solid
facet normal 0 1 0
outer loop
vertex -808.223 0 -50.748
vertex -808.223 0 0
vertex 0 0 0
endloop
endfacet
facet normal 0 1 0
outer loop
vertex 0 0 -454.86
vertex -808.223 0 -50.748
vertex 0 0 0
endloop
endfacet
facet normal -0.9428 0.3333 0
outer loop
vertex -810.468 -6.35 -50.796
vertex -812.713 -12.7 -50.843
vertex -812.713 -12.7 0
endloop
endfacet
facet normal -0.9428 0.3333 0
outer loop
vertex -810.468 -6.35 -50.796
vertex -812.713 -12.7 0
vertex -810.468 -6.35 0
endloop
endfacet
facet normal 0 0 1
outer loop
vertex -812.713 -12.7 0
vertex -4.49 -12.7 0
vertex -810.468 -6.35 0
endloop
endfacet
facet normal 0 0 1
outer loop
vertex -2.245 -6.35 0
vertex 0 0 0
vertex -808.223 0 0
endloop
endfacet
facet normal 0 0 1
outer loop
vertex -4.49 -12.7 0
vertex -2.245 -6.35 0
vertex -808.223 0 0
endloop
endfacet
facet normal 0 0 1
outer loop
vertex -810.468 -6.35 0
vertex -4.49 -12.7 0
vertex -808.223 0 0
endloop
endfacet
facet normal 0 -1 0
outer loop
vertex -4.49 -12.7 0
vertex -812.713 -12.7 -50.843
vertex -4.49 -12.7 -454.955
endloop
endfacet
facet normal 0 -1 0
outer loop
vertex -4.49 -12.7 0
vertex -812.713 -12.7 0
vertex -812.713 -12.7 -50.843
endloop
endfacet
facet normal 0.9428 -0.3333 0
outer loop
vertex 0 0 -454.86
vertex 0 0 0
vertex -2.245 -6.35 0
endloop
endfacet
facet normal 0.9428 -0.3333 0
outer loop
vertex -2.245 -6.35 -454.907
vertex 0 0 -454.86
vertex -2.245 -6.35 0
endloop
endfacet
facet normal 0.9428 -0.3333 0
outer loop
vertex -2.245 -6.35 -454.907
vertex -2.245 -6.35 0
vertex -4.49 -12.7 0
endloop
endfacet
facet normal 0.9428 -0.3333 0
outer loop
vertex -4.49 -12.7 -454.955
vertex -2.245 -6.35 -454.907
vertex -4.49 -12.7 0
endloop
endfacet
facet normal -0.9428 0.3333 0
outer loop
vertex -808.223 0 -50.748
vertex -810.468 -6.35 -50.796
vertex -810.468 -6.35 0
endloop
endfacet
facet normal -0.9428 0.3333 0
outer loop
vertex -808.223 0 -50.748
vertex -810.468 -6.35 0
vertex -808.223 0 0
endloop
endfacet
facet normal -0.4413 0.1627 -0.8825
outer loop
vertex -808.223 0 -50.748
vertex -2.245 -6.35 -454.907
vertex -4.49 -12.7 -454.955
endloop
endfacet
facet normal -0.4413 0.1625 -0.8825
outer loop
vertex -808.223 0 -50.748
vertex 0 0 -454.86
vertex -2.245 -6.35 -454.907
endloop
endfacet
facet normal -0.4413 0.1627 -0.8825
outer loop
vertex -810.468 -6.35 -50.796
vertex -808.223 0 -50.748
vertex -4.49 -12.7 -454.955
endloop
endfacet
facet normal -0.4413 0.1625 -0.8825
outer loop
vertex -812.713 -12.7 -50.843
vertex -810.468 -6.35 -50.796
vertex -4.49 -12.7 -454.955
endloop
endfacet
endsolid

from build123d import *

# Parameters (mm, degrees)
F1_DEPTH      = 12.7
F5_DEPTH      = 511.1661396565
F5_DEPTH_BACK = 511.1661396565
F7_DEPTH      = 457.201


with BuildPart() as f1:
    # F0 (on Front) → F1 (new body)
    with BuildSketch(Plane.XZ):
        Polygon((0, -457.2), (0, 0), (-914.4, 0), align=None)
    extrude(amount=F1_DEPTH)

    # F4 (on line) → F5 (cut, two sides)
    with BuildSketch(Plane(origin=(-274.32, 0, 137.16), x_dir=(0, 1, 0), z_dir=(0.894427191, 0, -0.4472135955))) as f5_sk:
        Polygon((-12.7, -408.9321117252), (0, -408.9321117252), (0, -406.8387485734), align=None)
    extrude(amount=-F5_DEPTH, mode=Mode.SUBTRACT)
    extrude(f5_sk.sketch, amount=F5_DEPTH_BACK, mode=Mode.SUBTRACT)

    # F6 (on face) → F7 (cut, through all)
    with BuildSketch(Plane.XY):
        Polygon((-912.0595488455, -6.35), (-810.468111026, -6.35), (-808.223047, 0), (-909.719097691, 0), align=None)
        Polygon((-812.7131750519, -12.7), (-810.468111026, -6.35), (-912.0595488455, -6.35), (-914.4, -12.7), align=None)
        Polygon((-2.245064026, -6.35), (0, -6.35), (0, 0), align=None)
        Polygon((0, -12.7), (0, -6.35), (-2.245064026, -6.35), (-4.4901280519, -12.7), align=None)
    extrude(amount=-F7_DEPTH, mode=Mode.SUBTRACT)


solid = f1.part
